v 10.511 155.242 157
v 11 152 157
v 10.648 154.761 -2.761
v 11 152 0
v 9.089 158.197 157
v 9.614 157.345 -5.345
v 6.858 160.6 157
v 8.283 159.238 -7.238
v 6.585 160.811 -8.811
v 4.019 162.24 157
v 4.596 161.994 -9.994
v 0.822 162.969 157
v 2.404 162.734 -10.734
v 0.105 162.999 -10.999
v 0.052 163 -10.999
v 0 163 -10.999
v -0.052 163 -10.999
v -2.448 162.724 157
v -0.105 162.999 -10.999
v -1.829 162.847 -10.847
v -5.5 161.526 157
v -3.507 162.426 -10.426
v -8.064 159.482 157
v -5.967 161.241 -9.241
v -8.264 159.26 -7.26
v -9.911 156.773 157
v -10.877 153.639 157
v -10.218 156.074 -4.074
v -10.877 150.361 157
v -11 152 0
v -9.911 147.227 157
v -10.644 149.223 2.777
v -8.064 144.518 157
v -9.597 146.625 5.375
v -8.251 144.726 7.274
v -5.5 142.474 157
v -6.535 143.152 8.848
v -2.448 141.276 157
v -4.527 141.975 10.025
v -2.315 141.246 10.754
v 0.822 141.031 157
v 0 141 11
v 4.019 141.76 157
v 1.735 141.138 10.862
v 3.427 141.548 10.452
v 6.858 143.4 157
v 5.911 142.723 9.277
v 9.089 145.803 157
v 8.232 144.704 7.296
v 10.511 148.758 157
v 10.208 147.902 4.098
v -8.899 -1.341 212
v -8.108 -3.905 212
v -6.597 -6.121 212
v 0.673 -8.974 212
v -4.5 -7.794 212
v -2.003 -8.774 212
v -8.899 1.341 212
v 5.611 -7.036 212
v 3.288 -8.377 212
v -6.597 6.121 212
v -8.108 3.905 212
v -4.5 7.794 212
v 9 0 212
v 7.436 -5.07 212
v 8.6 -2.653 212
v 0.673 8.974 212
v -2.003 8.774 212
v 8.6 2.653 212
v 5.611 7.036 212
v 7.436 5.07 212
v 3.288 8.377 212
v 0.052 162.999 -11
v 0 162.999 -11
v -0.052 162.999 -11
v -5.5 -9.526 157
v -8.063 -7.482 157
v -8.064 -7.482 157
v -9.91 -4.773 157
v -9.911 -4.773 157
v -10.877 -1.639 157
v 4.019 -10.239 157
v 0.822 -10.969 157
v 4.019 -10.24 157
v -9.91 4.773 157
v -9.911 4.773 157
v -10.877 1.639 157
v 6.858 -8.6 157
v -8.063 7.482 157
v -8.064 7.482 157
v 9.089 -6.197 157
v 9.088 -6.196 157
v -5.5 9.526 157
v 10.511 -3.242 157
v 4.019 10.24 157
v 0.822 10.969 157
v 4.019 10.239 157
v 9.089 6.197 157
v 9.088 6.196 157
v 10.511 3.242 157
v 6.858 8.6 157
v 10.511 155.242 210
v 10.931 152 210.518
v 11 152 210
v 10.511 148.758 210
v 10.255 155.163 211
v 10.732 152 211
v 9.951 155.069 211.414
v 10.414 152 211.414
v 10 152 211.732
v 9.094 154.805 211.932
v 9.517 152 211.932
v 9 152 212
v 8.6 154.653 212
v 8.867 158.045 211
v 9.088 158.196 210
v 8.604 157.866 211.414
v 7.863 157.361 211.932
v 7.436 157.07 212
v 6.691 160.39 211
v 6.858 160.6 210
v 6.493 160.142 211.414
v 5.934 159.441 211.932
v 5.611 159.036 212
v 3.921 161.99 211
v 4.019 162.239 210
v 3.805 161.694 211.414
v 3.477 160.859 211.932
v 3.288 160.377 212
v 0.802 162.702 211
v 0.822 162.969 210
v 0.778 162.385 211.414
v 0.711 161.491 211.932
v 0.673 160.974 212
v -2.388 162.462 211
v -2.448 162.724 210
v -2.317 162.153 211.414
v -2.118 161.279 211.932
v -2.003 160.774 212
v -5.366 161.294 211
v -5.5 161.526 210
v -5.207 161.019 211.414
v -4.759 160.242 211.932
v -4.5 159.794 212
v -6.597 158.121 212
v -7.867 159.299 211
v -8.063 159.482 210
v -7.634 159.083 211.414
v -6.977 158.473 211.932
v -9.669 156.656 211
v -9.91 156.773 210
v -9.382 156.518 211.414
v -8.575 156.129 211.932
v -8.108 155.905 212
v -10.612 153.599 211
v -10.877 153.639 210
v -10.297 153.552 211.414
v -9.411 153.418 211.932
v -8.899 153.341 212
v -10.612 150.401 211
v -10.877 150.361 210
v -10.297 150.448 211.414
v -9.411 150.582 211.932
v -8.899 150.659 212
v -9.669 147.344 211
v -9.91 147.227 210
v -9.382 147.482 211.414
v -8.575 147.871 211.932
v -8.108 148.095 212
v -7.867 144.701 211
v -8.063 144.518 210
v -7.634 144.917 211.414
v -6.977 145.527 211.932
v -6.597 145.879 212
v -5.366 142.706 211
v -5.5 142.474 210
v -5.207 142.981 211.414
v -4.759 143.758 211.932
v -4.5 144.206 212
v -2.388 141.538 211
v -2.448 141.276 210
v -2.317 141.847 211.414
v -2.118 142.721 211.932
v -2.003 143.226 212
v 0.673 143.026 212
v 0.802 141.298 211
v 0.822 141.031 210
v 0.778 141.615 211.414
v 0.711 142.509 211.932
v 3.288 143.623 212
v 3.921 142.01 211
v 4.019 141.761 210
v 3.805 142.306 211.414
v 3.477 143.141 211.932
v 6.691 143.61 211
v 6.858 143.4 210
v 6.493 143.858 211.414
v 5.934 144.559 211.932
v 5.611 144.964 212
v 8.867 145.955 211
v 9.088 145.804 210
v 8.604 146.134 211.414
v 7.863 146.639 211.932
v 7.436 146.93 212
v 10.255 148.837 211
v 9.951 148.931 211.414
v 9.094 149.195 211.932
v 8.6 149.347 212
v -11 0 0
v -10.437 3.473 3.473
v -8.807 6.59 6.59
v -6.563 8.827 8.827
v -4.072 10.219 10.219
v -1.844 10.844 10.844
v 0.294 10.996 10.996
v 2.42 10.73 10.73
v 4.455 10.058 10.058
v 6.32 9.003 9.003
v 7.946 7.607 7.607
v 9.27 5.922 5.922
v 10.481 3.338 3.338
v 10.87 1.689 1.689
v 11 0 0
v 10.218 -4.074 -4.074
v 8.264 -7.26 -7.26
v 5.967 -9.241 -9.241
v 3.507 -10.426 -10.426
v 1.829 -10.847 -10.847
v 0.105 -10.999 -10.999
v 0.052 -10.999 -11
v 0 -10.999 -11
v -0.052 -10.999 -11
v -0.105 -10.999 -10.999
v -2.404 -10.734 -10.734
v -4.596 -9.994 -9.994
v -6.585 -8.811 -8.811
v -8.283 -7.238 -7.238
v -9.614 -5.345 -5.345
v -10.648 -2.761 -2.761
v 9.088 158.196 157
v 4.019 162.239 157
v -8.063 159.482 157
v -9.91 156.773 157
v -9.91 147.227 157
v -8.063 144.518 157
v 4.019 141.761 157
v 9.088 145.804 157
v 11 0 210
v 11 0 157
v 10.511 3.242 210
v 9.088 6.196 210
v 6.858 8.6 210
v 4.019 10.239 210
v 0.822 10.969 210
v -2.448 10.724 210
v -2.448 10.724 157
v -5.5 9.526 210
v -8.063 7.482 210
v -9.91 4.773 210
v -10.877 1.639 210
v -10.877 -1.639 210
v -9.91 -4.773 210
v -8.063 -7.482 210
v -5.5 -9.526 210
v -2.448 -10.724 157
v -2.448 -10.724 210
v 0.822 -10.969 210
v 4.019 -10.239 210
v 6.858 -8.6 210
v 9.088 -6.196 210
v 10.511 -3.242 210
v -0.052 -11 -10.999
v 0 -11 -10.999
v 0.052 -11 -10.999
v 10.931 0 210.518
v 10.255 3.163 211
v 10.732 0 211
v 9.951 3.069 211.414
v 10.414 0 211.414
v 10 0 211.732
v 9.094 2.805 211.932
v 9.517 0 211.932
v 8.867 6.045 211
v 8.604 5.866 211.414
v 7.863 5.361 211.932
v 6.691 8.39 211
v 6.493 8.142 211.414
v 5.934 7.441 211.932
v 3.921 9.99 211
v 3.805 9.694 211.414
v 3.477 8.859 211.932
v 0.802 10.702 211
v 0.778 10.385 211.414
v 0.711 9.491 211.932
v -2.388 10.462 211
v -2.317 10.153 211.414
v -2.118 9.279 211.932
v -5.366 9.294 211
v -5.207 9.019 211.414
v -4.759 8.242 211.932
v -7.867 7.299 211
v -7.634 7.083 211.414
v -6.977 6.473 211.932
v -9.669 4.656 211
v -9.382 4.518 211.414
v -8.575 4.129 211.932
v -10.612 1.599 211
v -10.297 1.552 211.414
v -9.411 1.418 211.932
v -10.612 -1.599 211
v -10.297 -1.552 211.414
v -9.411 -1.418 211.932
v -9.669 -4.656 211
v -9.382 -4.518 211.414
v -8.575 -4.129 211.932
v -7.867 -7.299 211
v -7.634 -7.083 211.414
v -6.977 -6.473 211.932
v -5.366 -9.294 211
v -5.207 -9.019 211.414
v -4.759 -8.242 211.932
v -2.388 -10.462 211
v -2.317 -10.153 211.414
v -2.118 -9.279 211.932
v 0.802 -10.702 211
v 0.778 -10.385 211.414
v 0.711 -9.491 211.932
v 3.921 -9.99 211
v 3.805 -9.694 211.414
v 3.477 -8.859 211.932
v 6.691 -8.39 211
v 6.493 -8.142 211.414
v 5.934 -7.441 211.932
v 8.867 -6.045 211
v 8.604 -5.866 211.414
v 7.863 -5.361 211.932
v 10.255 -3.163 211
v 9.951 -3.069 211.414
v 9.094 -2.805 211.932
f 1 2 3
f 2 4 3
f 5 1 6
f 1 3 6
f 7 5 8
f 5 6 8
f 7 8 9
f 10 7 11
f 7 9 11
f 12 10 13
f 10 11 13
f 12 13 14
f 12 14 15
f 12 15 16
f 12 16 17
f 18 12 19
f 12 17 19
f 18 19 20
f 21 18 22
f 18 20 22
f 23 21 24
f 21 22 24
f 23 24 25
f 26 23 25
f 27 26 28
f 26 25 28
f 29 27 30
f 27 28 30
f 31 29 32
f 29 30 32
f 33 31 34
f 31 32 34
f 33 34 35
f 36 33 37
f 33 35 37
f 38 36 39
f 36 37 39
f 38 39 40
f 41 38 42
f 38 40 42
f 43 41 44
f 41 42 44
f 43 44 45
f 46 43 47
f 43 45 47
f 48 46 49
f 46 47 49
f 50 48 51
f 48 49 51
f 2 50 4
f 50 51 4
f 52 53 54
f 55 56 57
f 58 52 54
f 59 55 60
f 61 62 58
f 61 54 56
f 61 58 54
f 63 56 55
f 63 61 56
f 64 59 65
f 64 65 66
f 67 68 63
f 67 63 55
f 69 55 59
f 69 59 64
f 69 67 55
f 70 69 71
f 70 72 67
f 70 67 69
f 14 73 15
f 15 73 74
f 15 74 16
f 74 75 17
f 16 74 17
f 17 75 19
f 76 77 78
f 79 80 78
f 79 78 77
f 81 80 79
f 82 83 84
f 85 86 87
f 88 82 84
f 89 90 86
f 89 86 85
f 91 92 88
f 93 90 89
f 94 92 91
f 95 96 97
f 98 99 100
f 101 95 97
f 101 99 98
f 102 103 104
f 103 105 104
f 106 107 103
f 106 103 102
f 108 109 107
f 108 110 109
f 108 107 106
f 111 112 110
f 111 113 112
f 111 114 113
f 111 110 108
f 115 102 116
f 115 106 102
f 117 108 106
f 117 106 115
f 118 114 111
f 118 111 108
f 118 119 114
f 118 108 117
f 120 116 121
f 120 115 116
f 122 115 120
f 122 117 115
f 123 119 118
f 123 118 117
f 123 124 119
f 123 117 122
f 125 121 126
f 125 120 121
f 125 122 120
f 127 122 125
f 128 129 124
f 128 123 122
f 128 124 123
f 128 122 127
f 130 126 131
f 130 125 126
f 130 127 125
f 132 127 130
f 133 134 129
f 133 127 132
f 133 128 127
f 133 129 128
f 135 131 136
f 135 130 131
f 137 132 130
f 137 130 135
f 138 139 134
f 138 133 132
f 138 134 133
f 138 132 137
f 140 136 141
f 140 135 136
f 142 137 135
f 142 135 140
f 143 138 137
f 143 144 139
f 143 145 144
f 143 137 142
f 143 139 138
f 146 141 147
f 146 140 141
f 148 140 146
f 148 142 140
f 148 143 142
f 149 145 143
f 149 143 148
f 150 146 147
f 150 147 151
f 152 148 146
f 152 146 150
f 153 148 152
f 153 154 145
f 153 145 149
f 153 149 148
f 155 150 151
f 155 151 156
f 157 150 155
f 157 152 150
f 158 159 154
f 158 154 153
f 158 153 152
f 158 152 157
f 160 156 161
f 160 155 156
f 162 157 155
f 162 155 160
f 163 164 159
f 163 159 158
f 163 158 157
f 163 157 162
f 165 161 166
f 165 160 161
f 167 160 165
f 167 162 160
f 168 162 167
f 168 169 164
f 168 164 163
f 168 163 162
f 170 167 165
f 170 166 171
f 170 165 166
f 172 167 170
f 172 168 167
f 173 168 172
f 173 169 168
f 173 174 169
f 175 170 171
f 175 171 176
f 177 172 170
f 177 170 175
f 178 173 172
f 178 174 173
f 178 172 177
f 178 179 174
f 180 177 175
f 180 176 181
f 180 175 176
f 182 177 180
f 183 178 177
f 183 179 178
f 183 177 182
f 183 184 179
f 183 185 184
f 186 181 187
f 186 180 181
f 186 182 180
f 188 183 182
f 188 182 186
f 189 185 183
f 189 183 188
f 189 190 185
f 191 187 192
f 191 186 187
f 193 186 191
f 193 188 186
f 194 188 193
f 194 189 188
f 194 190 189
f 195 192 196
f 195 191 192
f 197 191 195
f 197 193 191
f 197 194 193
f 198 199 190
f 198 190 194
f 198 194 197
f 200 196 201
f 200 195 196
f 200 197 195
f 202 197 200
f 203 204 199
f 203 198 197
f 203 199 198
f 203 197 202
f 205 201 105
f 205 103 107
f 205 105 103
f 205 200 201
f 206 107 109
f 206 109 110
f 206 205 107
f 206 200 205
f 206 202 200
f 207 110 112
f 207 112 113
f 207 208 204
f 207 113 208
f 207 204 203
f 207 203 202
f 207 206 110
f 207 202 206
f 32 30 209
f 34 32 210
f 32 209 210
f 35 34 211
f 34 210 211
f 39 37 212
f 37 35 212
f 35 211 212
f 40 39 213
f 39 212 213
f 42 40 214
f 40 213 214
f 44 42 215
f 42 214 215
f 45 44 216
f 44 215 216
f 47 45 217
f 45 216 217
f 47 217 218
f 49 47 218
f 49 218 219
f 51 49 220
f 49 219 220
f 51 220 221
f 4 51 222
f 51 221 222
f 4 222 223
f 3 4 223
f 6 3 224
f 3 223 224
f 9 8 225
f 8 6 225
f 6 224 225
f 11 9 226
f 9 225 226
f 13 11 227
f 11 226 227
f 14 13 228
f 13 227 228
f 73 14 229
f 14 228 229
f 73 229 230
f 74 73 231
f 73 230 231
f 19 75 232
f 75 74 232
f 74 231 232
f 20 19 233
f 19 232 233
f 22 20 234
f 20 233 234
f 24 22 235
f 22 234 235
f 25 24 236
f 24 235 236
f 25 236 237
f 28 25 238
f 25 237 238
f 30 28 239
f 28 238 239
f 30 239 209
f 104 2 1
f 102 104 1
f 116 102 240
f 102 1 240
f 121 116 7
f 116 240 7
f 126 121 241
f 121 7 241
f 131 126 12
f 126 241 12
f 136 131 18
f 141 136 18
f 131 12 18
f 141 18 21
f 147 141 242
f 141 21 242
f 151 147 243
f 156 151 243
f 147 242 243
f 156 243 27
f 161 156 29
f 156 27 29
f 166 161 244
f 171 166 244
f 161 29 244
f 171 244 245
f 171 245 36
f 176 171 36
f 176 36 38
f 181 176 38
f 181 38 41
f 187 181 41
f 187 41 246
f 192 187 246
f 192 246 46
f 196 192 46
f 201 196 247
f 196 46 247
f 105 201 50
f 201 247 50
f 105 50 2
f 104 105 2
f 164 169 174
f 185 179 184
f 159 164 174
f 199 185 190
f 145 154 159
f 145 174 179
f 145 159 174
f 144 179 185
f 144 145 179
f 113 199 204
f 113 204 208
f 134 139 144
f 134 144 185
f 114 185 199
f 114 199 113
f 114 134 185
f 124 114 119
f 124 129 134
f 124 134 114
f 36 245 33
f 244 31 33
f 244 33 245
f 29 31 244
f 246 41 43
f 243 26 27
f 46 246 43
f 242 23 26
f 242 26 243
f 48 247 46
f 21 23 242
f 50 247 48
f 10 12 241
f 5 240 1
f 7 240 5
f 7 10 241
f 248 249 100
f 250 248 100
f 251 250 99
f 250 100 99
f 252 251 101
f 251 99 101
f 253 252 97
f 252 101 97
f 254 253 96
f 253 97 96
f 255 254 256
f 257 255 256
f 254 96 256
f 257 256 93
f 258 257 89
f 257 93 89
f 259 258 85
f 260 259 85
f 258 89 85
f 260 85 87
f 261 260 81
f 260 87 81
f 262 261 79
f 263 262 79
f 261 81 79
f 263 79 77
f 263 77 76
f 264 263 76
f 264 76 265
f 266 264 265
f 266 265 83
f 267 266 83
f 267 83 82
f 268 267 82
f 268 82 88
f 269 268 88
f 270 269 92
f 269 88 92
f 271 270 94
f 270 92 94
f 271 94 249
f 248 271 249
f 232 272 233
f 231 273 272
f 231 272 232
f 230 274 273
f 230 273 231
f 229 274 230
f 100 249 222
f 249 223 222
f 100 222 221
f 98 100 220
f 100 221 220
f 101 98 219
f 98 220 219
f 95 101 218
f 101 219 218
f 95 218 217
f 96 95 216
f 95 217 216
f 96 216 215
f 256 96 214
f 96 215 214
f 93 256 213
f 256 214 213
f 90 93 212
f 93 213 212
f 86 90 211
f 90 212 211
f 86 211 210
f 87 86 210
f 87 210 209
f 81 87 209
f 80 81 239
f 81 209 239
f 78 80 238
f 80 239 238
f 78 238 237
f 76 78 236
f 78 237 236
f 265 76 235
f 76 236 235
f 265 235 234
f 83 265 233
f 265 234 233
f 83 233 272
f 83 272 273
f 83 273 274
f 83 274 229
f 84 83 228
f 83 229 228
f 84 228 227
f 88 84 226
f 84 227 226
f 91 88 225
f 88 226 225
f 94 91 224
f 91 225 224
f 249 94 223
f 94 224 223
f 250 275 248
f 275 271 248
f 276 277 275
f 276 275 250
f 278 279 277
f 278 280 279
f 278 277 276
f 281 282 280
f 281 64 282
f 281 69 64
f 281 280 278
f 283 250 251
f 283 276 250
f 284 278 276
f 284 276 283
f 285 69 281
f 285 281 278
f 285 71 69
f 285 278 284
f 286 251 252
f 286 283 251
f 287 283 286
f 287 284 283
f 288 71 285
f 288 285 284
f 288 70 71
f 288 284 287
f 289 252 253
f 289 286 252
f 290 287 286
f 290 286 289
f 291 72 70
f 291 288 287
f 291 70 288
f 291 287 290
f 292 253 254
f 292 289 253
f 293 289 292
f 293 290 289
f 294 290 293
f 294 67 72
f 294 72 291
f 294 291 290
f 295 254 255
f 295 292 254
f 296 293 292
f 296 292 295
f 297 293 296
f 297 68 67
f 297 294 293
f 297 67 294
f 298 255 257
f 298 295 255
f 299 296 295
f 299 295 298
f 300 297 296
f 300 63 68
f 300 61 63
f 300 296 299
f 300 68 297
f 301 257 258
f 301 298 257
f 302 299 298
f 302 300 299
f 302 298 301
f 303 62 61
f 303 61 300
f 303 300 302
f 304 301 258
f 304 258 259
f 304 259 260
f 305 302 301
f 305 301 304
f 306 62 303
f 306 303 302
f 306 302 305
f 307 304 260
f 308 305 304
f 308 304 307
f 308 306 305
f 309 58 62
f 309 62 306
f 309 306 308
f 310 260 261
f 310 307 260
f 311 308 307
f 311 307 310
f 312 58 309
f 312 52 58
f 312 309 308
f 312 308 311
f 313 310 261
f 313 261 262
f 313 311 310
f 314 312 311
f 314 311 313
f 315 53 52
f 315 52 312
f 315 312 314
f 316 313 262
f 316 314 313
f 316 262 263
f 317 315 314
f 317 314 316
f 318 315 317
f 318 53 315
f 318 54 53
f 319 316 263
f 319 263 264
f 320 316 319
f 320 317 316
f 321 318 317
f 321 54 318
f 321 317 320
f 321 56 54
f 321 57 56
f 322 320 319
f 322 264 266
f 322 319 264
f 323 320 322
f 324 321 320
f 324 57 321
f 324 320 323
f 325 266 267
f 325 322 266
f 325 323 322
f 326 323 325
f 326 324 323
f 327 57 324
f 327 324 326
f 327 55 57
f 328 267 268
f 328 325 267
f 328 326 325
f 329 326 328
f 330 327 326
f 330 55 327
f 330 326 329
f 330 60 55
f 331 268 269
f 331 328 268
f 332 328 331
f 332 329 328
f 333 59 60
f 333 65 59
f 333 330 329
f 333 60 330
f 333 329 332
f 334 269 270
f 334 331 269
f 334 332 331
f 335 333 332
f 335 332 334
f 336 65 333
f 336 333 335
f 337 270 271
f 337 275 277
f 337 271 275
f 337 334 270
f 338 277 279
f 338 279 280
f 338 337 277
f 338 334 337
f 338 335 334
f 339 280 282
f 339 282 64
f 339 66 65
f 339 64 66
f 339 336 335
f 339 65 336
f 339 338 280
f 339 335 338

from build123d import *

# Parameters (mm, degrees)
SKETCH_1_R             = 11
EXTRUDE_1_DEPTH        = 157
SKETCH_2_R             = 11
EXTRUDE_2_DEPTH        = 152
PATTERN_LINEAR_1_COUNT = 2
PATTERN_LINEAR_1_PITCH = 152
CHAMFER_3_SIZE         = 21.999
SKETCH_3_R             = 10.9995
EXTRUDE_3_DEPTH        = 55
FILLET_1_R             = 2


with BuildPart() as part:
    # 草图1 → 拉伸1 (new body)
    with BuildSketch(Plane.XY):
        Circle(SKETCH_1_R)
    extrude_1 = extrude(amount=EXTRUDE_1_DEPTH)

    # 草图2 → 拉伸2 (add)
    with BuildSketch(Plane(origin=(0, 0, 0), x_dir=(1, 0, 0), z_dir=(0, 1, 0))):
        with Locations(Location((0, 0, 0), (0, 0, 180))):
            Circle(SKETCH_2_R)
    extrude(amount=EXTRUDE_2_DEPTH)

    # 阵列(线性)1: 拉伸1 ×2
    with Locations(*[(0, i * PATTERN_LINEAR_1_PITCH, 0) for i in range(1, PATTERN_LINEAR_1_COUNT)]):
        add(extrude_1)

    # 倒角3
    # the kernel refuses this chamfer: 21.999 mm, written as the material it adds along each edge
    with BuildSketch(Plane(origin=(67.574454052, 0, 0), x_dir=(0, -0.9996219169112966, 0.027495876610586372), z_dir=(-1, 0, 0))) as chamfer_3_piece_1_section:
        Polygon((CHAMFER_3_SIZE * 0.999621916911, -CHAMFER_3_SIZE * 0.0274958766106), (-CHAMFER_3_SIZE * 0.0274958766106, -CHAMFER_3_SIZE * 0.999621916911), (0, 0), align=None)
    chamfer_3_piece_1 = extrude(amount=135.148908105, mode=Mode.PRIVATE)
    chamfer_3_piece_1 = chamfer_3_piece_1 & Plane(origin=(0, 0, -4.859651136), x_dir=(1, 0, 0), z_dir=(0, 0, -1)) * Cylinder(11, 359, mode=Mode.PRIVATE)
    chamfer_3_piece_1 = chamfer_3_piece_1 & Plane(origin=(0, -4.859651136, 0), x_dir=(-1, 0, 0), z_dir=(0, -1, 0)) * Cylinder(11, 359, mode=Mode.PRIVATE)
    add(chamfer_3_piece_1)
    with BuildSketch(Plane(origin=(-67.574454052, 152, 0), x_dir=(0, -0.027495876610586986, -0.9996219169112966), z_dir=(1, 0, 0))) as chamfer_3_piece_2_section:
        Polygon((CHAMFER_3_SIZE * 0.999621916911, CHAMFER_3_SIZE * 0.0274958766106), (-CHAMFER_3_SIZE * 0.0274958766106, CHAMFER_3_SIZE * 0.999621916911), (0, 0), align=None)
    chamfer_3_piece_2 = extrude(amount=135.148908105, mode=Mode.PRIVATE)
    chamfer_3_piece_2 = chamfer_3_piece_2 & Plane(origin=(0, 156.859651136, 0), x_dir=(-1, 0, 0), z_dir=(0, -1, 0)) * Cylinder(11, 359, mode=Mode.PRIVATE)
    chamfer_3_piece_2 = chamfer_3_piece_2 & Plane(origin=(0, 152, -4.859651136), x_dir=(1, 0, 0), z_dir=(0, 0, -1)) * Cylinder(11, 359, mode=Mode.PRIVATE)
    add(chamfer_3_piece_2)

    # 草图3 → 拉伸3 (add)
    with BuildSketch(Plane.XY.offset(157)):
        with Locations((0, 152)):
            Circle(SKETCH_3_R)
        Circle(SKETCH_3_R)
    extrude(amount=EXTRUDE_3_DEPTH)

    # 圆角1
    fillet_1_edges = [part.edges().sort_by_distance(p)[0] for p in [
        (-10.9995, 152, 212),
        (-10.9995, 0, 212),
    ]]
    fillet(fillet_1_edges, radius=FILLET_1_R)


solid = part.part
